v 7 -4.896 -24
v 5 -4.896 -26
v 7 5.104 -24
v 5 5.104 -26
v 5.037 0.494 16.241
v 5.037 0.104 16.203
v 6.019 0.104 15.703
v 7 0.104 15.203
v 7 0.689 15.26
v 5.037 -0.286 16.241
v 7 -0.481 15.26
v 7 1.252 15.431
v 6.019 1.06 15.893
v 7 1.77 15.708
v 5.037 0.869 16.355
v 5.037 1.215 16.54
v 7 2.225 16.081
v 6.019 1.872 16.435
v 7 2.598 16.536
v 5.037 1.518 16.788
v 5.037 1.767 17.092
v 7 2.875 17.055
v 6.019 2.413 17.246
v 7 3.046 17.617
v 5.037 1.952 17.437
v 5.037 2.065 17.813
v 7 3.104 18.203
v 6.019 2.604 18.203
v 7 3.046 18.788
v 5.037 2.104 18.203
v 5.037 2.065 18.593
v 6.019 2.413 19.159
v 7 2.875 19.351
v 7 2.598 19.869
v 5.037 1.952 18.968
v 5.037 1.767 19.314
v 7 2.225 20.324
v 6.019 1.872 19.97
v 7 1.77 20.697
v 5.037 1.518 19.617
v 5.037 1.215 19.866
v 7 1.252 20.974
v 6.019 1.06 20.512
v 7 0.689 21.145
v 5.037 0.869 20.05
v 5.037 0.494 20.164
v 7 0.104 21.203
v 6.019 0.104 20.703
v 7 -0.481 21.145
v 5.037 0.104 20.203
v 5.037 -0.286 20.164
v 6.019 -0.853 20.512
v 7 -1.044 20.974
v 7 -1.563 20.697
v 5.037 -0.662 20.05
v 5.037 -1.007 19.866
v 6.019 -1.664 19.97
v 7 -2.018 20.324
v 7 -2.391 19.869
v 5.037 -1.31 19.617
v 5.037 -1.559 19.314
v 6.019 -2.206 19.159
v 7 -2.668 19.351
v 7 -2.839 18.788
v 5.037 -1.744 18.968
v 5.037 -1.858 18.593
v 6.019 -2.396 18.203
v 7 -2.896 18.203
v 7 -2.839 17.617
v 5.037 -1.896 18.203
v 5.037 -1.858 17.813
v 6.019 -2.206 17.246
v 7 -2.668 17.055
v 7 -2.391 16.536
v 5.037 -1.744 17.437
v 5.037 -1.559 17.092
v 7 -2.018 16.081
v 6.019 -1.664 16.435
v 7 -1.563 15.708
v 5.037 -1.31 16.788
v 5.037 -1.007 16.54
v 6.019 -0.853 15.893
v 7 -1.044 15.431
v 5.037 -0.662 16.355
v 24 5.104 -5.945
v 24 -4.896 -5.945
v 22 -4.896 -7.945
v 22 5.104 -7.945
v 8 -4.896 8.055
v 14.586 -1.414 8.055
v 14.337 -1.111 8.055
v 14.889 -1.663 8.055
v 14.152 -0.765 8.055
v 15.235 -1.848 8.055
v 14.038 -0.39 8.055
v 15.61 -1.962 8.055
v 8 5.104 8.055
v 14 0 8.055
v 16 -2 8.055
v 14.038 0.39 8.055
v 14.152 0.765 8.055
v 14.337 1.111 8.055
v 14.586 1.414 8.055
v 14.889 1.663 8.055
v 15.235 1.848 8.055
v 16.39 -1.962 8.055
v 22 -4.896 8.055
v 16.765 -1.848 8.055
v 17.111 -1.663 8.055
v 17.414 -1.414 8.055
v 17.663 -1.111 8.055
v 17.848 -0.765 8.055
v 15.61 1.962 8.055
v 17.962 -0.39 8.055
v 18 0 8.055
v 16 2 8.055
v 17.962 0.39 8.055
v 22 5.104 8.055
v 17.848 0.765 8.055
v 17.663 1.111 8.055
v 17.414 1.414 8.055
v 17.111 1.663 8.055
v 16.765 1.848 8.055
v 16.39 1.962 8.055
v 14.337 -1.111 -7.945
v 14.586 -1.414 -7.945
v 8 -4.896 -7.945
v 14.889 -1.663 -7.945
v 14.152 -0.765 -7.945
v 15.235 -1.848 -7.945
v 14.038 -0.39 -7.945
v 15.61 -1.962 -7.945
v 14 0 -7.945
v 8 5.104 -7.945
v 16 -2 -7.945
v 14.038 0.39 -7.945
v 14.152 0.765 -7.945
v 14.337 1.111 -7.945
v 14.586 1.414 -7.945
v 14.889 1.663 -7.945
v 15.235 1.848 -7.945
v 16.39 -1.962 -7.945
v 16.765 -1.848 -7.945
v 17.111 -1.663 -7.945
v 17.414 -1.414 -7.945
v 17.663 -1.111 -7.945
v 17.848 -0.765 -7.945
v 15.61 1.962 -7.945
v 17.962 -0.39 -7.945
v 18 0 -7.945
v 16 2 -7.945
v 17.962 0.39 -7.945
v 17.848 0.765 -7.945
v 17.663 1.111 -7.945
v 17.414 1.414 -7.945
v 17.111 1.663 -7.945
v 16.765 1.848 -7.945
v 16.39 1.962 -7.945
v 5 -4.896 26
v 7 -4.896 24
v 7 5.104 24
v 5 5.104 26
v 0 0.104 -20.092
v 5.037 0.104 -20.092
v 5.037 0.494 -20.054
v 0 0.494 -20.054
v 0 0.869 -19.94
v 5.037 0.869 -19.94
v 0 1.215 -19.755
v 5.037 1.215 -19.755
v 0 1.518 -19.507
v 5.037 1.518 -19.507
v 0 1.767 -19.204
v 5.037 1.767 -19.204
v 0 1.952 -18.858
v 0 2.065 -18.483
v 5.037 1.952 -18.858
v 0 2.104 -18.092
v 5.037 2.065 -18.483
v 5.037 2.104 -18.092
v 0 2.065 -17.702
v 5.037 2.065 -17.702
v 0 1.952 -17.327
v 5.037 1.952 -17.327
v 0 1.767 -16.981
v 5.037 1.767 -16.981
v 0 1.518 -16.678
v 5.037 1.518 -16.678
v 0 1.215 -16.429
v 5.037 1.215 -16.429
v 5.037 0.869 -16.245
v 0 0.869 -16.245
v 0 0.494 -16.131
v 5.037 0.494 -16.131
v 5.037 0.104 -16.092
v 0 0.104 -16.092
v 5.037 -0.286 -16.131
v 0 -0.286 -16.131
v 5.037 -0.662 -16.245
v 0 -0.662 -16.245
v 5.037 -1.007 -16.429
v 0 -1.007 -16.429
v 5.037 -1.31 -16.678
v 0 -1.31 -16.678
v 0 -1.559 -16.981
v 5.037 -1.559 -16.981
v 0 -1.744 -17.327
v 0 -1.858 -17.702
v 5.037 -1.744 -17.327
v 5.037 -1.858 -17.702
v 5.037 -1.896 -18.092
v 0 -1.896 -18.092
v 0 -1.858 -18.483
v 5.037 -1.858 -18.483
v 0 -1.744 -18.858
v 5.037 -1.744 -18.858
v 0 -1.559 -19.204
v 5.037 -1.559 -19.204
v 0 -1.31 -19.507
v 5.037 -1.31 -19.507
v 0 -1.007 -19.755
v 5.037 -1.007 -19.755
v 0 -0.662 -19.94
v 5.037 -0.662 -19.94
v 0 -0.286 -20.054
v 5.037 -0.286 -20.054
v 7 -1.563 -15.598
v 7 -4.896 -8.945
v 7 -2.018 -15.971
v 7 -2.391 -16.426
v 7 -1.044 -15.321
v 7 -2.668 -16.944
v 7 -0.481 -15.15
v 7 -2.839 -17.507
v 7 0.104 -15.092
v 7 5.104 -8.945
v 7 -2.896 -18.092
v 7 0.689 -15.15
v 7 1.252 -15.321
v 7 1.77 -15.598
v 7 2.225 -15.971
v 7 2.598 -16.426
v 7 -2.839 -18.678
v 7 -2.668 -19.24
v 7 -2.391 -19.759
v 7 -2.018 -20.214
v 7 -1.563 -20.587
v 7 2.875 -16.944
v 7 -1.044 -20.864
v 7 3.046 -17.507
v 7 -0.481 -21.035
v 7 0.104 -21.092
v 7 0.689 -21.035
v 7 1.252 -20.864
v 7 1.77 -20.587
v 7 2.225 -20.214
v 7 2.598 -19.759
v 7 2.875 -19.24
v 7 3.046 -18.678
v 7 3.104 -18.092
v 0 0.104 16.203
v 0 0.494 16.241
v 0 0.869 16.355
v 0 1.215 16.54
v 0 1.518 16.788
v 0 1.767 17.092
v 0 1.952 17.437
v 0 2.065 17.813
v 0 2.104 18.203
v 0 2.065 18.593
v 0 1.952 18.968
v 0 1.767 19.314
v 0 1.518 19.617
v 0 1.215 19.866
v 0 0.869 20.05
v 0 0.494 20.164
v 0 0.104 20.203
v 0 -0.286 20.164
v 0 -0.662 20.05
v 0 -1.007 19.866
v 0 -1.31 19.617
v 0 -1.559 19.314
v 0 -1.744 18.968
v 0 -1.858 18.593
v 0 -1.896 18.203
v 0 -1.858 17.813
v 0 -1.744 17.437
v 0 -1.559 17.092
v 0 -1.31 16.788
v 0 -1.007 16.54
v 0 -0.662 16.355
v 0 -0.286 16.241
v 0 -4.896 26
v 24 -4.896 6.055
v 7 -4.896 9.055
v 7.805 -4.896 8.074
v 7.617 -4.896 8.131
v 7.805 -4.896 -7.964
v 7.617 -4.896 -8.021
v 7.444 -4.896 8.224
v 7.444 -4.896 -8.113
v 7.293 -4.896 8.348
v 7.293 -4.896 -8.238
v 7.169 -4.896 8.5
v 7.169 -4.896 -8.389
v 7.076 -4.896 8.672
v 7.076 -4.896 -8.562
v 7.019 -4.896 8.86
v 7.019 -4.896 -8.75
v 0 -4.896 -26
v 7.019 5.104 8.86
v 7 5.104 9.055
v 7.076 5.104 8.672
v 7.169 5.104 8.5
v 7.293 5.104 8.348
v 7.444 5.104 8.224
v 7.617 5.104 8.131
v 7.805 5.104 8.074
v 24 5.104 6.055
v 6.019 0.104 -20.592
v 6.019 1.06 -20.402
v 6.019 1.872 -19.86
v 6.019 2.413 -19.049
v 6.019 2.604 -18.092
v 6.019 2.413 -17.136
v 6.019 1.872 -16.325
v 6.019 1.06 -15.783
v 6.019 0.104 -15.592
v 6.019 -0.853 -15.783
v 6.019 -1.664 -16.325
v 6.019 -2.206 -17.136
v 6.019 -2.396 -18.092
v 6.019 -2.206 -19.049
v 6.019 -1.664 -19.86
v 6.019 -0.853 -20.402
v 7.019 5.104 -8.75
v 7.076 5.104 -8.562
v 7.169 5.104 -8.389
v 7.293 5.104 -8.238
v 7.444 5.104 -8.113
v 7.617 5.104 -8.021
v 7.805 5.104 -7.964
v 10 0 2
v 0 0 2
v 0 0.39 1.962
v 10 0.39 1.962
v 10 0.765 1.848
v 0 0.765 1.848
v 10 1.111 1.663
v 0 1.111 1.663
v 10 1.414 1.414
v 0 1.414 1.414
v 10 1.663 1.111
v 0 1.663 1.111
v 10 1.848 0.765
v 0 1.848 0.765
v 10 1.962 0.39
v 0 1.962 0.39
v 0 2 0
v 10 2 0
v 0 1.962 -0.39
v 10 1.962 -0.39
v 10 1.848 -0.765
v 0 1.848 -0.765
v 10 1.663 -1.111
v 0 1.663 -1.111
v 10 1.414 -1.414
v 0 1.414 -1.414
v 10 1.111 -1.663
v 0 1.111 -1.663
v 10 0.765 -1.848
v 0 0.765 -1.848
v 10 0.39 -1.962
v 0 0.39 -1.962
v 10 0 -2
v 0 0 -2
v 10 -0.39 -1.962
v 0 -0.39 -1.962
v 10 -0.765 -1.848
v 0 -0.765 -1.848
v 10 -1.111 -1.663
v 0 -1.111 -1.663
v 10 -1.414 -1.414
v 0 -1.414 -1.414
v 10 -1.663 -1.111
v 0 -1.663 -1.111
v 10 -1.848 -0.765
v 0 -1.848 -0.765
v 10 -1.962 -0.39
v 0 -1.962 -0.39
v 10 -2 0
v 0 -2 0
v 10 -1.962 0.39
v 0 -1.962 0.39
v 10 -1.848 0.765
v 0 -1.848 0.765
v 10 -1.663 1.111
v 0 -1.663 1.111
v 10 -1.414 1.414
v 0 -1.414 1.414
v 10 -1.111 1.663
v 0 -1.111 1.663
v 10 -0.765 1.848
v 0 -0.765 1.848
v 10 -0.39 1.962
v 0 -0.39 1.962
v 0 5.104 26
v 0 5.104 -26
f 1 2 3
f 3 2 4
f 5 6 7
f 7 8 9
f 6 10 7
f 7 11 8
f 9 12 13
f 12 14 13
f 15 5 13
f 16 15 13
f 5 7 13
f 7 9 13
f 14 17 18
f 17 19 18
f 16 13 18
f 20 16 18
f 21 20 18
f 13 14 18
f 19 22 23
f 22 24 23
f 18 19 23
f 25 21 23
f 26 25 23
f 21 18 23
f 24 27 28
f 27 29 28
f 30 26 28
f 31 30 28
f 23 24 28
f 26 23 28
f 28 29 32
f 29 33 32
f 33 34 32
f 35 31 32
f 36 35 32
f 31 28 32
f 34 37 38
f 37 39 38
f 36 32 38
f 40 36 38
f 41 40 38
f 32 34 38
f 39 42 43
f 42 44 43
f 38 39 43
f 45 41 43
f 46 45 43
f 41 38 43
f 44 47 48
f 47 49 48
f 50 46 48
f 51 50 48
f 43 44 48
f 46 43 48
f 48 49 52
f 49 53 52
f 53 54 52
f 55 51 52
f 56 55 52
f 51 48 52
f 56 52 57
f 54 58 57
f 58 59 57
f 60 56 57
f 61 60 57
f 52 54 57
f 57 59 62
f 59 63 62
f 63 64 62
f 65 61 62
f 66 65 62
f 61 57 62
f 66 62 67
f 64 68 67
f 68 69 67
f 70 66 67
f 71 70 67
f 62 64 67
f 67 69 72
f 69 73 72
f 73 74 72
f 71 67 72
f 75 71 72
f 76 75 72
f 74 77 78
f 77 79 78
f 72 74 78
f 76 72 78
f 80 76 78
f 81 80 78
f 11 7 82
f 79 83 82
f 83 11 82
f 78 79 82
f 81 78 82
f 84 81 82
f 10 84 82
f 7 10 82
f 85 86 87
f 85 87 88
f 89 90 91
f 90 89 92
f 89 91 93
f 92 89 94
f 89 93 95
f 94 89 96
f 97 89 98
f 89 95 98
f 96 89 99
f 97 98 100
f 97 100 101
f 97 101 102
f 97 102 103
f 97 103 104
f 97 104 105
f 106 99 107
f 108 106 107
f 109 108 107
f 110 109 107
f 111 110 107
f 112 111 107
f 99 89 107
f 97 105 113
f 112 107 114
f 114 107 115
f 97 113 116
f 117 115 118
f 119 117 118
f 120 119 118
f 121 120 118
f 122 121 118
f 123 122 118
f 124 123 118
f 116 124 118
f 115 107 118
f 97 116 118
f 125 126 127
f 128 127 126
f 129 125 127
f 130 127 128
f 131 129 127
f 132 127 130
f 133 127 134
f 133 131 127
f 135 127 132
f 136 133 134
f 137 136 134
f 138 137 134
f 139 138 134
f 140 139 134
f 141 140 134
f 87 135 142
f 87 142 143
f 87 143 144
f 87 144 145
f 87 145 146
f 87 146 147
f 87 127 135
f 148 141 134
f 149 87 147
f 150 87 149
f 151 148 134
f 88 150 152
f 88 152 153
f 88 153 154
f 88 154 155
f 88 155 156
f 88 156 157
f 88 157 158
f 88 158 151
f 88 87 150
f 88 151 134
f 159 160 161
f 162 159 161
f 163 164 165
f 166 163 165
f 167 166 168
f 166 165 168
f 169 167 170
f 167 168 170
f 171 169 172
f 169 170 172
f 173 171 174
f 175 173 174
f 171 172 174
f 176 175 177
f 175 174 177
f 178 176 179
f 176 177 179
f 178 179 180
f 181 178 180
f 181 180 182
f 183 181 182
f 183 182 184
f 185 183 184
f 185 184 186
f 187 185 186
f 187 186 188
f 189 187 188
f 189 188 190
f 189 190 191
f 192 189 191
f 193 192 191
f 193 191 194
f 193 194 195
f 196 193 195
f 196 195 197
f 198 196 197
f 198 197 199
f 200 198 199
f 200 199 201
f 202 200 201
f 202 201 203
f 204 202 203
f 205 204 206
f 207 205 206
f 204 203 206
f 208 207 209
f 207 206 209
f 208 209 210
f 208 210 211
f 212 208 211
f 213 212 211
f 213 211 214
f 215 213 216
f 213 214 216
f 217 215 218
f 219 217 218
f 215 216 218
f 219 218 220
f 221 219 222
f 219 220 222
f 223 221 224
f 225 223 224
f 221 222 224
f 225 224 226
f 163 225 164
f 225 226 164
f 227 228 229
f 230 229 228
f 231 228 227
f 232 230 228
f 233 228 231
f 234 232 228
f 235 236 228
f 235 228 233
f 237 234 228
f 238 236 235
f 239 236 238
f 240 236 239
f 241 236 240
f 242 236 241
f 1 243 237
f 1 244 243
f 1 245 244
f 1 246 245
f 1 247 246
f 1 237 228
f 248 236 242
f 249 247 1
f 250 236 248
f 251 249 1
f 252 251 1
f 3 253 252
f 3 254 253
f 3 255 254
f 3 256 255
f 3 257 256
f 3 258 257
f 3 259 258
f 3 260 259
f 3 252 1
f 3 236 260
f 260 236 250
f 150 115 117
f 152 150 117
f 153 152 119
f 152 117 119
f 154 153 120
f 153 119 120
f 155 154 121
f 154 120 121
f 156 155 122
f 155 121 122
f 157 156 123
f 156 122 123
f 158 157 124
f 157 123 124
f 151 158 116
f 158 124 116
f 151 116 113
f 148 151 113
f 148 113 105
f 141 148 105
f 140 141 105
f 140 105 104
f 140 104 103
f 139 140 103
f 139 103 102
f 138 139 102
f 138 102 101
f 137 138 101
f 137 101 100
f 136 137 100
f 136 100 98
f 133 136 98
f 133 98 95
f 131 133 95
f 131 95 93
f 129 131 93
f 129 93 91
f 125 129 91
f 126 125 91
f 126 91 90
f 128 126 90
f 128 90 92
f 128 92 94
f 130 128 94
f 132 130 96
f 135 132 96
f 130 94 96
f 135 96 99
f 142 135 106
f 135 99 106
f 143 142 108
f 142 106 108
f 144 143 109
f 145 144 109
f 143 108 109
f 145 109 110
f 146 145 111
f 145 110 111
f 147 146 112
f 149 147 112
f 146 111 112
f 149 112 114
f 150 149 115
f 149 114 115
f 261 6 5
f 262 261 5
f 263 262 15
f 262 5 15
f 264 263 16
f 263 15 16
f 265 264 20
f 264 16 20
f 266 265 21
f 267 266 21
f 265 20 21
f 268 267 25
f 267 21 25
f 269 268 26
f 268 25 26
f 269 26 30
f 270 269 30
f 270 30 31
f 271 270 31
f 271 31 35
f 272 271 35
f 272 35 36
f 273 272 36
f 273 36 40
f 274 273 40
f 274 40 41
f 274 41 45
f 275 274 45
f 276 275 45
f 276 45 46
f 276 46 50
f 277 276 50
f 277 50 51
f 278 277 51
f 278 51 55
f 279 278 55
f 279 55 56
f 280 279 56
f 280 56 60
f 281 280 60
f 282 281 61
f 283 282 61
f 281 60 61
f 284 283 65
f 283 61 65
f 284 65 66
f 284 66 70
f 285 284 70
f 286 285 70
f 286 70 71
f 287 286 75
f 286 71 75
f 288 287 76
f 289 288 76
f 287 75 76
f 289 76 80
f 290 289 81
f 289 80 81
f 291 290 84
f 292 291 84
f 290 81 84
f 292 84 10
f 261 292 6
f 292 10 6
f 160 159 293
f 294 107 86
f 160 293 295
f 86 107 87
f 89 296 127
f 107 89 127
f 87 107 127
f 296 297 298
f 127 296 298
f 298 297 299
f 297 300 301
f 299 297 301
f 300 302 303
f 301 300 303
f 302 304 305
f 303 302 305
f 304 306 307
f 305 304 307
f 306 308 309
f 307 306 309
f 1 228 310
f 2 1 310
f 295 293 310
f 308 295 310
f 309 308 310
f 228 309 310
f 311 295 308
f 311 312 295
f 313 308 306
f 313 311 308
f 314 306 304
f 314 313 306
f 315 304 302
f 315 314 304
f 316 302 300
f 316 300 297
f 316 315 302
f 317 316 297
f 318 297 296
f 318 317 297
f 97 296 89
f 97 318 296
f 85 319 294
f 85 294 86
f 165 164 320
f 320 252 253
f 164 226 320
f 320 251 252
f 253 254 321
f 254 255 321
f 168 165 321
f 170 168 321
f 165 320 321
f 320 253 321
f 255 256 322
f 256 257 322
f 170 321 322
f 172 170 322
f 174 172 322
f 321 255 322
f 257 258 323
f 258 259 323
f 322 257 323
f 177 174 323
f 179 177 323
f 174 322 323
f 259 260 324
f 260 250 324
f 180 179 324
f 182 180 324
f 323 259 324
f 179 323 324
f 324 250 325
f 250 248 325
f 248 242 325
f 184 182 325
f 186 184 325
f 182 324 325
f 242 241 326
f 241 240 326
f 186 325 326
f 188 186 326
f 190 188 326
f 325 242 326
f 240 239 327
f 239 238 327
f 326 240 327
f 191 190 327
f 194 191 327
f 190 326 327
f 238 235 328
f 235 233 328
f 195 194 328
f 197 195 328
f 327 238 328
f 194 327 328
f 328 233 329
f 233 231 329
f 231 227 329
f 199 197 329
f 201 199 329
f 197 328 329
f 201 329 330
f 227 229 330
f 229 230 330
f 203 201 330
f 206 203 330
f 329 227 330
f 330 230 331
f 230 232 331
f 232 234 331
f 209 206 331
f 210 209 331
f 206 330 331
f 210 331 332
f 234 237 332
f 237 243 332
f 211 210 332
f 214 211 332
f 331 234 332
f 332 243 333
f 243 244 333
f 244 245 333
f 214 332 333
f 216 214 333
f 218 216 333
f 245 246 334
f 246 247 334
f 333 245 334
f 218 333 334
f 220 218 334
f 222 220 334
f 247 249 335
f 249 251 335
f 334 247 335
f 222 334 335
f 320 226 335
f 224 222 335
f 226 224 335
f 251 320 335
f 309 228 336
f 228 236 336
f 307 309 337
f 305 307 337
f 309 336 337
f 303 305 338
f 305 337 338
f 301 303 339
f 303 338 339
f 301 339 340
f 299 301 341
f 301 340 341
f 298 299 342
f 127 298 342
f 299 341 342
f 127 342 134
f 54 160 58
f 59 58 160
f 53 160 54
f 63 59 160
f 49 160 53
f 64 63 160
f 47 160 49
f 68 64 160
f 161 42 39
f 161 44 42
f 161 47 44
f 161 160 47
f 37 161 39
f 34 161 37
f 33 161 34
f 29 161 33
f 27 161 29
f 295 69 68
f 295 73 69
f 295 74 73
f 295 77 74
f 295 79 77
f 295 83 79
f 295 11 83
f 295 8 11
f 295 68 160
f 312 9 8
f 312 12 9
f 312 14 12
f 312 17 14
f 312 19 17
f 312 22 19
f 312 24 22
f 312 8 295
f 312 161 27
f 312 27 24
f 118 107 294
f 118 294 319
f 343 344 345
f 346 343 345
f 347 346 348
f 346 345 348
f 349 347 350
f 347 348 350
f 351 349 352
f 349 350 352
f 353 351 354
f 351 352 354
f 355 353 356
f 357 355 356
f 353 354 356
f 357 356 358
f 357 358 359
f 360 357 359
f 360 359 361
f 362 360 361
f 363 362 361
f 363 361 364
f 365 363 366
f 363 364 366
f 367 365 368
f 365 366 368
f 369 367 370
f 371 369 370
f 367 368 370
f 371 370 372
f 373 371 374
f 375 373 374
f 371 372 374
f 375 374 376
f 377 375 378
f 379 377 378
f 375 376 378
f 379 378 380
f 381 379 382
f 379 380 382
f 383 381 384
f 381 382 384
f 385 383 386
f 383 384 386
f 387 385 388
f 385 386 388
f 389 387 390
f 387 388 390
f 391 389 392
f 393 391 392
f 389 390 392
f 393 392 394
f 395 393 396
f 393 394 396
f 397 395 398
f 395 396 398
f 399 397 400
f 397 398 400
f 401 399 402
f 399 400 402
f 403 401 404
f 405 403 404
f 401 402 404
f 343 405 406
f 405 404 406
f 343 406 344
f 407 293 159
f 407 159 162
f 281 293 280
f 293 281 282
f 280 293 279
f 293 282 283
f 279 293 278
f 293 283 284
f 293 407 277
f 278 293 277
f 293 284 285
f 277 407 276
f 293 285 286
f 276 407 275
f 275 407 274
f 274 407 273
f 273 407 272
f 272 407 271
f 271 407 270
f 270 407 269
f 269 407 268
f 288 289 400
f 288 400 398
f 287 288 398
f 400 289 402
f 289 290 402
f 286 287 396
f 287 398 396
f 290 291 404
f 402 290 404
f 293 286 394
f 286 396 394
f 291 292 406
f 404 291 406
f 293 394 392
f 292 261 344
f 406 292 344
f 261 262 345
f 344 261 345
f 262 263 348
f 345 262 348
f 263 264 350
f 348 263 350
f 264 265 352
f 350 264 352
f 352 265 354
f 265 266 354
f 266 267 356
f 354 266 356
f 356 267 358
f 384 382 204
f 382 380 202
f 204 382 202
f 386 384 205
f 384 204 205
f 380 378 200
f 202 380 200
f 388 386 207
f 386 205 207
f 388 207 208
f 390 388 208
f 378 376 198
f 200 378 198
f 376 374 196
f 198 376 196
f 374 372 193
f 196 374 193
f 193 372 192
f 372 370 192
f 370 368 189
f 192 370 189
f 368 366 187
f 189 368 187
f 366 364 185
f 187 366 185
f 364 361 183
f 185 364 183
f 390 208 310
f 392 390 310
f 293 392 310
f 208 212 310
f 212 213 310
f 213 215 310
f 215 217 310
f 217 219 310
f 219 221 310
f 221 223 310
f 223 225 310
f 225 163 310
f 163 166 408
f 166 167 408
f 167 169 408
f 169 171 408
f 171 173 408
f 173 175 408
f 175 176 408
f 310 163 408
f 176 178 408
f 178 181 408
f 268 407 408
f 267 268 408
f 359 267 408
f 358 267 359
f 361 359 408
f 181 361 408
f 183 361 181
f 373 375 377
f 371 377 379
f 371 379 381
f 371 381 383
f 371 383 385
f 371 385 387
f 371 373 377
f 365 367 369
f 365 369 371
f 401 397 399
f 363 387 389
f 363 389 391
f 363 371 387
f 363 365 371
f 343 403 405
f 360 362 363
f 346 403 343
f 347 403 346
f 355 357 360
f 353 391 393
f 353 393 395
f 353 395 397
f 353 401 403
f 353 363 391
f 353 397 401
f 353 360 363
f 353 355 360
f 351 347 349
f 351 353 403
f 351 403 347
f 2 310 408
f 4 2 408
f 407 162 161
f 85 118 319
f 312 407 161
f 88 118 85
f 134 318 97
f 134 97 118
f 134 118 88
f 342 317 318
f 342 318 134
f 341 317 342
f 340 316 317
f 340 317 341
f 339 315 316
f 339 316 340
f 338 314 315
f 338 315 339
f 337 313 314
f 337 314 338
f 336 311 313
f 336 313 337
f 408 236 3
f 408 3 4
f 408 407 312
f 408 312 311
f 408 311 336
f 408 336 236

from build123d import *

# Parameters (mm, degrees)
SKETCH_1_W                    = 52
SKETCH_1_H                    = 10
EXTRUDE_1_DEPTH               = 24
SKETCH_2_W                    = 23.570504403
SKETCH_2_H                    = 14.285983016
SKETCH_2_W_2                  = 23.570504402
CUT_EXTRUDE_1_DEPTH           = 17
FILLET_1_R                    = 1
CHAMFER_1_SIZE                = 2
SKETCH_3_R                    = 2
CUT_EXTRUDE_2_DEPTH           = 32.480923073
SKETCH_4_R                    = 2
CUT_EXTRUDE_3_DEPTH           = 42.973818432
SKETCH_5_R                    = 3
CUT_EXTRUDE_4_DEPTH           = 2
CUT_EXTRUDE_4_DRAFT           = -27
CUT_EXTRUDE_4_PROFILE_2_DEPTH = 2
CUT_EXTRUDE_4_PROFILE_2_DRAFT = -27
SKETCH_6_R                    = 2
CUT_EXTRUDE_2_2_DEPTH         = 10


with BuildPart() as part:
    # Эскиз1 → Вытянуть1 (new body)
    with BuildSketch(Plane(origin=(0, 0, 0), x_dir=(0, 0, -1), z_dir=(1, 0, 0))):
        with Locations((0, 0.103774831)):
            Rectangle(SKETCH_1_W, SKETCH_1_H)
    extrude(amount=EXTRUDE_1_DEPTH)

    # Эскиз2 → Вырез-Вытянуть1 (cut)
    with BuildSketch(Plane(origin=(24, 0, 0), x_dir=(0, 0, -1), z_dir=(1, 0, 0))):
        with Locations((-19.840397425, -1.378733322)):
            Rectangle(SKETCH_2_W, SKETCH_2_H)
        with Locations((19.730106978, -1.378733322)):
            Rectangle(SKETCH_2_W_2, SKETCH_2_H)
    extrude(amount=-CUT_EXTRUDE_1_DEPTH, mode=Mode.SUBTRACT)

    # Скругление1
    fillet_1_edges = [part.edges().sort_by_distance(p)[0] for p in [
        (7, 0.103774831, 8.055145223),
        (7, 0.103774831, -7.944854777),
    ]]
    fillet(fillet_1_edges, radius=FILLET_1_R)

    # Фаска1
    chamfer_1_edges = [part.edges().sort_by_distance(p)[0] for p in [
        (24, 0.103774831, 8.055145223),
        (7, 0.103774831, 26),
        (24, 0.103774831, -7.944854777),
        (7, 0.103774831, -26),
    ]]
    chamfer(chamfer_1_edges, length=CHAMFER_1_SIZE)

    # Эскиз3 → Cut-Extrude 2 (cut, through all)
    with BuildSketch(Plane(origin=(7, 0, 0), x_dir=(0, 0, -1), z_dir=(1, 0, 0))):
        with Locations((-18.202696524, 0.103774831)):
            Circle(SKETCH_3_R)
        with Locations((18.092406077, 0.103774831)):
            Circle(SKETCH_3_R)
    extrude(amount=-CUT_EXTRUDE_2_DEPTH, mode=Mode.SUBTRACT)

    # Эскиз4 → Вырез-Вытянуть3 (cut, through all)
    with BuildSketch(Plane.XY.offset(8.055145223)):
        with Locations((16, 0)):
            Circle(SKETCH_4_R)
    extrude(amount=-CUT_EXTRUDE_3_DEPTH, mode=Mode.SUBTRACT)


with BuildPart() as cut_extrude_4_tool:
    # Эскиз5 → Вырез-Вытянуть4 (with draft: the straight prism first)
    with BuildSketch(Plane(origin=(7, 0, 0), x_dir=(0, 0, -1), z_dir=(1, 0, 0))):
        with Locations((-18.202696524, 0.103774831)):
            Circle(SKETCH_5_R)
    extrude(amount=-CUT_EXTRUDE_4_DEPTH)
    # Вырез-Вытянуть4: the draft: its side faces are tilted about the plane it starts from
    cut_extrude_4_sides = [cut_extrude_4_tool.faces().sort_by_distance(p)[0] for p in [
        (6, 0.103774831, 21.202696524),
    ]]
    draft(cut_extrude_4_sides, Plane(origin=(7, 0, 0), x_dir=(0, 0, -1), z_dir=(1, 0, 0)), CUT_EXTRUDE_4_DRAFT)


with BuildPart() as part_1:
    add(part.part)

    # Вырез-Вытянуть4: cut by cut_extrude_4_tool
    add(cut_extrude_4_tool.part, mode=Mode.SUBTRACT)


with BuildPart() as cut_extrude_4_profile_2_tool:
    # Эскиз5 → Вырез-Вытянуть4 profile 2 (with draft: the straight prism first)
    with BuildSketch(Plane(origin=(7, 0, 0), x_dir=(0, 0, -1), z_dir=(1, 0, 0))):
        with Locations((18.092406077, 0.103774831)):
            Circle(SKETCH_5_R)
    extrude(amount=-CUT_EXTRUDE_4_PROFILE_2_DEPTH)
    # Вырез-Вытянуть4 profile 2: the draft: its side faces are tilted about the plane it starts from
    cut_extrude_4_profile_2_sides = [cut_extrude_4_profile_2_tool.faces().sort_by_distance(p)[0] for p in [
        (6, 0.103774831, -15.092406077),
    ]]
    draft(cut_extrude_4_profile_2_sides, Plane(origin=(7, 0, 0), x_dir=(0, 0, -1), z_dir=(1, 0, 0)), CUT_EXTRUDE_4_PROFILE_2_DRAFT)


with BuildPart() as part_2:
    add(part_1.part)

    # Вырез-Вытянуть4 profile 2: cut by cut_extrude_4_profile_2_tool
    add(cut_extrude_4_profile_2_tool.part, mode=Mode.SUBTRACT)

    # Эскиз6 → Cut-Extrude 2 2 (cut)
    with BuildSketch(Plane.ZY):
        Circle(SKETCH_6_R)
    extrude(amount=-CUT_EXTRUDE_2_2_DEPTH, mode=Mode.SUBTRACT)


solid = part_2.part
